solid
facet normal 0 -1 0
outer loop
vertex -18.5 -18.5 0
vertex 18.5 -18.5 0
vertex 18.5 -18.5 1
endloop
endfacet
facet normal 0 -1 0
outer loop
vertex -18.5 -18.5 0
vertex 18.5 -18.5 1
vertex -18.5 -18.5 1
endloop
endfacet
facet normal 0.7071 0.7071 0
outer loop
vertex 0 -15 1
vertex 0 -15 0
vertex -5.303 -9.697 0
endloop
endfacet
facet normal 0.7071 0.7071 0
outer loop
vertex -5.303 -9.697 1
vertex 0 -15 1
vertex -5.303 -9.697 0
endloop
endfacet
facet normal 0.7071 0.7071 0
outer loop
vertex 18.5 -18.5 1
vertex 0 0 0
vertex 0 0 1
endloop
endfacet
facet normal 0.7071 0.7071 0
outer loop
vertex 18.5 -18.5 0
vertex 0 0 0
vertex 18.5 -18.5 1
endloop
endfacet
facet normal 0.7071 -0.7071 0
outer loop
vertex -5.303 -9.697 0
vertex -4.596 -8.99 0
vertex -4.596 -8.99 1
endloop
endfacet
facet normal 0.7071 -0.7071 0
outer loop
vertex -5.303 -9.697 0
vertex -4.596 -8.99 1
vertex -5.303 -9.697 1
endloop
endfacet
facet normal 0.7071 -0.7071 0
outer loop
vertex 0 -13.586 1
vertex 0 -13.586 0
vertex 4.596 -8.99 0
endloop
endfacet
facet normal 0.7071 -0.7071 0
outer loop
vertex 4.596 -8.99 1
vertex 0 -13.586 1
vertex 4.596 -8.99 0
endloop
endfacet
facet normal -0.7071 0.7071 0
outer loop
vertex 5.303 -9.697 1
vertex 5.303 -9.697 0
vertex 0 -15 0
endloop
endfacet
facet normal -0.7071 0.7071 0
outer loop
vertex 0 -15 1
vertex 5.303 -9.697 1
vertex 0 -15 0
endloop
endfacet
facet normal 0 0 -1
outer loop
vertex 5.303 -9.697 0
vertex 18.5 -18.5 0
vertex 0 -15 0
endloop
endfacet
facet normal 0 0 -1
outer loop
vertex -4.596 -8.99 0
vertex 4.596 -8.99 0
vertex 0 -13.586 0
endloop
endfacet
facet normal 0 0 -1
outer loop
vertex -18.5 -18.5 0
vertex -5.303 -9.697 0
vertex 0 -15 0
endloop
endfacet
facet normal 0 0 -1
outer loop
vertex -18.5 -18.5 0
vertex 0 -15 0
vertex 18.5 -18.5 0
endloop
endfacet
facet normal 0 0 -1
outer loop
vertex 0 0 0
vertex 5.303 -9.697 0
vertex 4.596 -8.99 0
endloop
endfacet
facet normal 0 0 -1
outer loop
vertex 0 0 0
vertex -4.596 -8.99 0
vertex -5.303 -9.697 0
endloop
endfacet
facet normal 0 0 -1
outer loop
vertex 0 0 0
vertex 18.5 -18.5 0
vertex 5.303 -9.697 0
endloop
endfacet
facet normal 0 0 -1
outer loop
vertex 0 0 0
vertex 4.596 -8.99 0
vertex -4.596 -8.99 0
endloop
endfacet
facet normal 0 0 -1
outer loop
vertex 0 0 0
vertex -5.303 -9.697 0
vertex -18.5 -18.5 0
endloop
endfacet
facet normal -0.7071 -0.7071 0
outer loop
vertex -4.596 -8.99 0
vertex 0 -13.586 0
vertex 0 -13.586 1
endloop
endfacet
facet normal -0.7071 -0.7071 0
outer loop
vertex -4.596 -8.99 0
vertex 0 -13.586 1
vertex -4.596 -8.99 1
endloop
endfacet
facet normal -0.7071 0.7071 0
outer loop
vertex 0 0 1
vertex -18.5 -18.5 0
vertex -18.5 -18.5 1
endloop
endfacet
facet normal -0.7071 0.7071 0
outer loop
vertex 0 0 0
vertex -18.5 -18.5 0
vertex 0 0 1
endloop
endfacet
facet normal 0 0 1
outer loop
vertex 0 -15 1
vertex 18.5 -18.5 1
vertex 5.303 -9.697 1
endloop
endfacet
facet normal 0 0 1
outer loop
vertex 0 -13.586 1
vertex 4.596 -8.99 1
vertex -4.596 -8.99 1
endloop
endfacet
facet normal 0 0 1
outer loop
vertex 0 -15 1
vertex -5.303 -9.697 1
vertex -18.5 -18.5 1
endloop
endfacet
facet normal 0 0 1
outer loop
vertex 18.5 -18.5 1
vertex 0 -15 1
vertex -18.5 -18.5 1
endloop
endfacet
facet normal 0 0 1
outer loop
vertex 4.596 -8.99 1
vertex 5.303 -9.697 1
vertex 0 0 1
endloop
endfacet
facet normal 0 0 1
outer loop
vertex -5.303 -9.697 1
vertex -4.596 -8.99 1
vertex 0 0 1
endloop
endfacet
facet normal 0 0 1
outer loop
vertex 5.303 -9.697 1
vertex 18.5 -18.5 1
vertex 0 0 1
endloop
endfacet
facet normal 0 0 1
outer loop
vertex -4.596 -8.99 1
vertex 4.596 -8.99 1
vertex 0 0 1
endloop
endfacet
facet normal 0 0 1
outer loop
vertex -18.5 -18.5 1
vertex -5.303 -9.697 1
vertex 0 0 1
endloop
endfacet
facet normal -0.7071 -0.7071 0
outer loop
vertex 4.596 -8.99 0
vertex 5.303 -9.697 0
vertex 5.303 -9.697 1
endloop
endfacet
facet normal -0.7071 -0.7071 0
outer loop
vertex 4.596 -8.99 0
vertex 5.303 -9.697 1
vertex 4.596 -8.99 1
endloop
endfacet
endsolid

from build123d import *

# Parameters (mm, degrees)
BOX092_W                  = 7.5
BOX092_H                  = 1
BOX092_DEPTH              = 2
BOX090_W                  = 7.5
BOX090_H                  = 1
BOX090_DEPTH              = 2
FUSION018_PLACEMENT_ANGLE = 45
EXTRUDE001_DEPTH          = 1


with BuildPart() as cube092:
    # Box092 → Box092 (new body)
    with BuildSketch(Plane.XY):
        with Locations((3.75, 0.5)):
            Rectangle(BOX092_W, BOX092_H)
    extrude(amount=BOX092_DEPTH)


with BuildPart() as bigarrowhole001:
    # Box090 → Box090 (new body)
    with BuildSketch(Plane(origin=(1, 0, 0), x_dir=(0, 1, 0), z_dir=(0, 0, 1))):
        with Locations((3.75, 0.5)):
            Rectangle(BOX090_W, BOX090_H)
    extrude(amount=BOX090_DEPTH)

    # Fusion018: union Cube092
    add(cube092.part)


with BuildPart() as bigarrowhole001_1:
    # Fusion018 placement: moved
    add(bigarrowhole001.part.moved(Location((0, -15, 0))).rotate(Axis((0, -15, 0), (0, 0, 1)), FUSION018_PLACEMENT_ANGLE))


with BuildPart() as cut010:
    # Sketch012 → Extrude001 (new body)
    with BuildSketch(Plane.XY):
        Polygon((0, 0), (18.5, -18.5), (-18.5, -18.5), align=None)
    extrude(amount=EXTRUDE001_DEPTH)

    # Cut010: cut BigArrowHole001
    add(bigarrowhole001_1.part, mode=Mode.SUBTRACT)


solid = cut010.part
